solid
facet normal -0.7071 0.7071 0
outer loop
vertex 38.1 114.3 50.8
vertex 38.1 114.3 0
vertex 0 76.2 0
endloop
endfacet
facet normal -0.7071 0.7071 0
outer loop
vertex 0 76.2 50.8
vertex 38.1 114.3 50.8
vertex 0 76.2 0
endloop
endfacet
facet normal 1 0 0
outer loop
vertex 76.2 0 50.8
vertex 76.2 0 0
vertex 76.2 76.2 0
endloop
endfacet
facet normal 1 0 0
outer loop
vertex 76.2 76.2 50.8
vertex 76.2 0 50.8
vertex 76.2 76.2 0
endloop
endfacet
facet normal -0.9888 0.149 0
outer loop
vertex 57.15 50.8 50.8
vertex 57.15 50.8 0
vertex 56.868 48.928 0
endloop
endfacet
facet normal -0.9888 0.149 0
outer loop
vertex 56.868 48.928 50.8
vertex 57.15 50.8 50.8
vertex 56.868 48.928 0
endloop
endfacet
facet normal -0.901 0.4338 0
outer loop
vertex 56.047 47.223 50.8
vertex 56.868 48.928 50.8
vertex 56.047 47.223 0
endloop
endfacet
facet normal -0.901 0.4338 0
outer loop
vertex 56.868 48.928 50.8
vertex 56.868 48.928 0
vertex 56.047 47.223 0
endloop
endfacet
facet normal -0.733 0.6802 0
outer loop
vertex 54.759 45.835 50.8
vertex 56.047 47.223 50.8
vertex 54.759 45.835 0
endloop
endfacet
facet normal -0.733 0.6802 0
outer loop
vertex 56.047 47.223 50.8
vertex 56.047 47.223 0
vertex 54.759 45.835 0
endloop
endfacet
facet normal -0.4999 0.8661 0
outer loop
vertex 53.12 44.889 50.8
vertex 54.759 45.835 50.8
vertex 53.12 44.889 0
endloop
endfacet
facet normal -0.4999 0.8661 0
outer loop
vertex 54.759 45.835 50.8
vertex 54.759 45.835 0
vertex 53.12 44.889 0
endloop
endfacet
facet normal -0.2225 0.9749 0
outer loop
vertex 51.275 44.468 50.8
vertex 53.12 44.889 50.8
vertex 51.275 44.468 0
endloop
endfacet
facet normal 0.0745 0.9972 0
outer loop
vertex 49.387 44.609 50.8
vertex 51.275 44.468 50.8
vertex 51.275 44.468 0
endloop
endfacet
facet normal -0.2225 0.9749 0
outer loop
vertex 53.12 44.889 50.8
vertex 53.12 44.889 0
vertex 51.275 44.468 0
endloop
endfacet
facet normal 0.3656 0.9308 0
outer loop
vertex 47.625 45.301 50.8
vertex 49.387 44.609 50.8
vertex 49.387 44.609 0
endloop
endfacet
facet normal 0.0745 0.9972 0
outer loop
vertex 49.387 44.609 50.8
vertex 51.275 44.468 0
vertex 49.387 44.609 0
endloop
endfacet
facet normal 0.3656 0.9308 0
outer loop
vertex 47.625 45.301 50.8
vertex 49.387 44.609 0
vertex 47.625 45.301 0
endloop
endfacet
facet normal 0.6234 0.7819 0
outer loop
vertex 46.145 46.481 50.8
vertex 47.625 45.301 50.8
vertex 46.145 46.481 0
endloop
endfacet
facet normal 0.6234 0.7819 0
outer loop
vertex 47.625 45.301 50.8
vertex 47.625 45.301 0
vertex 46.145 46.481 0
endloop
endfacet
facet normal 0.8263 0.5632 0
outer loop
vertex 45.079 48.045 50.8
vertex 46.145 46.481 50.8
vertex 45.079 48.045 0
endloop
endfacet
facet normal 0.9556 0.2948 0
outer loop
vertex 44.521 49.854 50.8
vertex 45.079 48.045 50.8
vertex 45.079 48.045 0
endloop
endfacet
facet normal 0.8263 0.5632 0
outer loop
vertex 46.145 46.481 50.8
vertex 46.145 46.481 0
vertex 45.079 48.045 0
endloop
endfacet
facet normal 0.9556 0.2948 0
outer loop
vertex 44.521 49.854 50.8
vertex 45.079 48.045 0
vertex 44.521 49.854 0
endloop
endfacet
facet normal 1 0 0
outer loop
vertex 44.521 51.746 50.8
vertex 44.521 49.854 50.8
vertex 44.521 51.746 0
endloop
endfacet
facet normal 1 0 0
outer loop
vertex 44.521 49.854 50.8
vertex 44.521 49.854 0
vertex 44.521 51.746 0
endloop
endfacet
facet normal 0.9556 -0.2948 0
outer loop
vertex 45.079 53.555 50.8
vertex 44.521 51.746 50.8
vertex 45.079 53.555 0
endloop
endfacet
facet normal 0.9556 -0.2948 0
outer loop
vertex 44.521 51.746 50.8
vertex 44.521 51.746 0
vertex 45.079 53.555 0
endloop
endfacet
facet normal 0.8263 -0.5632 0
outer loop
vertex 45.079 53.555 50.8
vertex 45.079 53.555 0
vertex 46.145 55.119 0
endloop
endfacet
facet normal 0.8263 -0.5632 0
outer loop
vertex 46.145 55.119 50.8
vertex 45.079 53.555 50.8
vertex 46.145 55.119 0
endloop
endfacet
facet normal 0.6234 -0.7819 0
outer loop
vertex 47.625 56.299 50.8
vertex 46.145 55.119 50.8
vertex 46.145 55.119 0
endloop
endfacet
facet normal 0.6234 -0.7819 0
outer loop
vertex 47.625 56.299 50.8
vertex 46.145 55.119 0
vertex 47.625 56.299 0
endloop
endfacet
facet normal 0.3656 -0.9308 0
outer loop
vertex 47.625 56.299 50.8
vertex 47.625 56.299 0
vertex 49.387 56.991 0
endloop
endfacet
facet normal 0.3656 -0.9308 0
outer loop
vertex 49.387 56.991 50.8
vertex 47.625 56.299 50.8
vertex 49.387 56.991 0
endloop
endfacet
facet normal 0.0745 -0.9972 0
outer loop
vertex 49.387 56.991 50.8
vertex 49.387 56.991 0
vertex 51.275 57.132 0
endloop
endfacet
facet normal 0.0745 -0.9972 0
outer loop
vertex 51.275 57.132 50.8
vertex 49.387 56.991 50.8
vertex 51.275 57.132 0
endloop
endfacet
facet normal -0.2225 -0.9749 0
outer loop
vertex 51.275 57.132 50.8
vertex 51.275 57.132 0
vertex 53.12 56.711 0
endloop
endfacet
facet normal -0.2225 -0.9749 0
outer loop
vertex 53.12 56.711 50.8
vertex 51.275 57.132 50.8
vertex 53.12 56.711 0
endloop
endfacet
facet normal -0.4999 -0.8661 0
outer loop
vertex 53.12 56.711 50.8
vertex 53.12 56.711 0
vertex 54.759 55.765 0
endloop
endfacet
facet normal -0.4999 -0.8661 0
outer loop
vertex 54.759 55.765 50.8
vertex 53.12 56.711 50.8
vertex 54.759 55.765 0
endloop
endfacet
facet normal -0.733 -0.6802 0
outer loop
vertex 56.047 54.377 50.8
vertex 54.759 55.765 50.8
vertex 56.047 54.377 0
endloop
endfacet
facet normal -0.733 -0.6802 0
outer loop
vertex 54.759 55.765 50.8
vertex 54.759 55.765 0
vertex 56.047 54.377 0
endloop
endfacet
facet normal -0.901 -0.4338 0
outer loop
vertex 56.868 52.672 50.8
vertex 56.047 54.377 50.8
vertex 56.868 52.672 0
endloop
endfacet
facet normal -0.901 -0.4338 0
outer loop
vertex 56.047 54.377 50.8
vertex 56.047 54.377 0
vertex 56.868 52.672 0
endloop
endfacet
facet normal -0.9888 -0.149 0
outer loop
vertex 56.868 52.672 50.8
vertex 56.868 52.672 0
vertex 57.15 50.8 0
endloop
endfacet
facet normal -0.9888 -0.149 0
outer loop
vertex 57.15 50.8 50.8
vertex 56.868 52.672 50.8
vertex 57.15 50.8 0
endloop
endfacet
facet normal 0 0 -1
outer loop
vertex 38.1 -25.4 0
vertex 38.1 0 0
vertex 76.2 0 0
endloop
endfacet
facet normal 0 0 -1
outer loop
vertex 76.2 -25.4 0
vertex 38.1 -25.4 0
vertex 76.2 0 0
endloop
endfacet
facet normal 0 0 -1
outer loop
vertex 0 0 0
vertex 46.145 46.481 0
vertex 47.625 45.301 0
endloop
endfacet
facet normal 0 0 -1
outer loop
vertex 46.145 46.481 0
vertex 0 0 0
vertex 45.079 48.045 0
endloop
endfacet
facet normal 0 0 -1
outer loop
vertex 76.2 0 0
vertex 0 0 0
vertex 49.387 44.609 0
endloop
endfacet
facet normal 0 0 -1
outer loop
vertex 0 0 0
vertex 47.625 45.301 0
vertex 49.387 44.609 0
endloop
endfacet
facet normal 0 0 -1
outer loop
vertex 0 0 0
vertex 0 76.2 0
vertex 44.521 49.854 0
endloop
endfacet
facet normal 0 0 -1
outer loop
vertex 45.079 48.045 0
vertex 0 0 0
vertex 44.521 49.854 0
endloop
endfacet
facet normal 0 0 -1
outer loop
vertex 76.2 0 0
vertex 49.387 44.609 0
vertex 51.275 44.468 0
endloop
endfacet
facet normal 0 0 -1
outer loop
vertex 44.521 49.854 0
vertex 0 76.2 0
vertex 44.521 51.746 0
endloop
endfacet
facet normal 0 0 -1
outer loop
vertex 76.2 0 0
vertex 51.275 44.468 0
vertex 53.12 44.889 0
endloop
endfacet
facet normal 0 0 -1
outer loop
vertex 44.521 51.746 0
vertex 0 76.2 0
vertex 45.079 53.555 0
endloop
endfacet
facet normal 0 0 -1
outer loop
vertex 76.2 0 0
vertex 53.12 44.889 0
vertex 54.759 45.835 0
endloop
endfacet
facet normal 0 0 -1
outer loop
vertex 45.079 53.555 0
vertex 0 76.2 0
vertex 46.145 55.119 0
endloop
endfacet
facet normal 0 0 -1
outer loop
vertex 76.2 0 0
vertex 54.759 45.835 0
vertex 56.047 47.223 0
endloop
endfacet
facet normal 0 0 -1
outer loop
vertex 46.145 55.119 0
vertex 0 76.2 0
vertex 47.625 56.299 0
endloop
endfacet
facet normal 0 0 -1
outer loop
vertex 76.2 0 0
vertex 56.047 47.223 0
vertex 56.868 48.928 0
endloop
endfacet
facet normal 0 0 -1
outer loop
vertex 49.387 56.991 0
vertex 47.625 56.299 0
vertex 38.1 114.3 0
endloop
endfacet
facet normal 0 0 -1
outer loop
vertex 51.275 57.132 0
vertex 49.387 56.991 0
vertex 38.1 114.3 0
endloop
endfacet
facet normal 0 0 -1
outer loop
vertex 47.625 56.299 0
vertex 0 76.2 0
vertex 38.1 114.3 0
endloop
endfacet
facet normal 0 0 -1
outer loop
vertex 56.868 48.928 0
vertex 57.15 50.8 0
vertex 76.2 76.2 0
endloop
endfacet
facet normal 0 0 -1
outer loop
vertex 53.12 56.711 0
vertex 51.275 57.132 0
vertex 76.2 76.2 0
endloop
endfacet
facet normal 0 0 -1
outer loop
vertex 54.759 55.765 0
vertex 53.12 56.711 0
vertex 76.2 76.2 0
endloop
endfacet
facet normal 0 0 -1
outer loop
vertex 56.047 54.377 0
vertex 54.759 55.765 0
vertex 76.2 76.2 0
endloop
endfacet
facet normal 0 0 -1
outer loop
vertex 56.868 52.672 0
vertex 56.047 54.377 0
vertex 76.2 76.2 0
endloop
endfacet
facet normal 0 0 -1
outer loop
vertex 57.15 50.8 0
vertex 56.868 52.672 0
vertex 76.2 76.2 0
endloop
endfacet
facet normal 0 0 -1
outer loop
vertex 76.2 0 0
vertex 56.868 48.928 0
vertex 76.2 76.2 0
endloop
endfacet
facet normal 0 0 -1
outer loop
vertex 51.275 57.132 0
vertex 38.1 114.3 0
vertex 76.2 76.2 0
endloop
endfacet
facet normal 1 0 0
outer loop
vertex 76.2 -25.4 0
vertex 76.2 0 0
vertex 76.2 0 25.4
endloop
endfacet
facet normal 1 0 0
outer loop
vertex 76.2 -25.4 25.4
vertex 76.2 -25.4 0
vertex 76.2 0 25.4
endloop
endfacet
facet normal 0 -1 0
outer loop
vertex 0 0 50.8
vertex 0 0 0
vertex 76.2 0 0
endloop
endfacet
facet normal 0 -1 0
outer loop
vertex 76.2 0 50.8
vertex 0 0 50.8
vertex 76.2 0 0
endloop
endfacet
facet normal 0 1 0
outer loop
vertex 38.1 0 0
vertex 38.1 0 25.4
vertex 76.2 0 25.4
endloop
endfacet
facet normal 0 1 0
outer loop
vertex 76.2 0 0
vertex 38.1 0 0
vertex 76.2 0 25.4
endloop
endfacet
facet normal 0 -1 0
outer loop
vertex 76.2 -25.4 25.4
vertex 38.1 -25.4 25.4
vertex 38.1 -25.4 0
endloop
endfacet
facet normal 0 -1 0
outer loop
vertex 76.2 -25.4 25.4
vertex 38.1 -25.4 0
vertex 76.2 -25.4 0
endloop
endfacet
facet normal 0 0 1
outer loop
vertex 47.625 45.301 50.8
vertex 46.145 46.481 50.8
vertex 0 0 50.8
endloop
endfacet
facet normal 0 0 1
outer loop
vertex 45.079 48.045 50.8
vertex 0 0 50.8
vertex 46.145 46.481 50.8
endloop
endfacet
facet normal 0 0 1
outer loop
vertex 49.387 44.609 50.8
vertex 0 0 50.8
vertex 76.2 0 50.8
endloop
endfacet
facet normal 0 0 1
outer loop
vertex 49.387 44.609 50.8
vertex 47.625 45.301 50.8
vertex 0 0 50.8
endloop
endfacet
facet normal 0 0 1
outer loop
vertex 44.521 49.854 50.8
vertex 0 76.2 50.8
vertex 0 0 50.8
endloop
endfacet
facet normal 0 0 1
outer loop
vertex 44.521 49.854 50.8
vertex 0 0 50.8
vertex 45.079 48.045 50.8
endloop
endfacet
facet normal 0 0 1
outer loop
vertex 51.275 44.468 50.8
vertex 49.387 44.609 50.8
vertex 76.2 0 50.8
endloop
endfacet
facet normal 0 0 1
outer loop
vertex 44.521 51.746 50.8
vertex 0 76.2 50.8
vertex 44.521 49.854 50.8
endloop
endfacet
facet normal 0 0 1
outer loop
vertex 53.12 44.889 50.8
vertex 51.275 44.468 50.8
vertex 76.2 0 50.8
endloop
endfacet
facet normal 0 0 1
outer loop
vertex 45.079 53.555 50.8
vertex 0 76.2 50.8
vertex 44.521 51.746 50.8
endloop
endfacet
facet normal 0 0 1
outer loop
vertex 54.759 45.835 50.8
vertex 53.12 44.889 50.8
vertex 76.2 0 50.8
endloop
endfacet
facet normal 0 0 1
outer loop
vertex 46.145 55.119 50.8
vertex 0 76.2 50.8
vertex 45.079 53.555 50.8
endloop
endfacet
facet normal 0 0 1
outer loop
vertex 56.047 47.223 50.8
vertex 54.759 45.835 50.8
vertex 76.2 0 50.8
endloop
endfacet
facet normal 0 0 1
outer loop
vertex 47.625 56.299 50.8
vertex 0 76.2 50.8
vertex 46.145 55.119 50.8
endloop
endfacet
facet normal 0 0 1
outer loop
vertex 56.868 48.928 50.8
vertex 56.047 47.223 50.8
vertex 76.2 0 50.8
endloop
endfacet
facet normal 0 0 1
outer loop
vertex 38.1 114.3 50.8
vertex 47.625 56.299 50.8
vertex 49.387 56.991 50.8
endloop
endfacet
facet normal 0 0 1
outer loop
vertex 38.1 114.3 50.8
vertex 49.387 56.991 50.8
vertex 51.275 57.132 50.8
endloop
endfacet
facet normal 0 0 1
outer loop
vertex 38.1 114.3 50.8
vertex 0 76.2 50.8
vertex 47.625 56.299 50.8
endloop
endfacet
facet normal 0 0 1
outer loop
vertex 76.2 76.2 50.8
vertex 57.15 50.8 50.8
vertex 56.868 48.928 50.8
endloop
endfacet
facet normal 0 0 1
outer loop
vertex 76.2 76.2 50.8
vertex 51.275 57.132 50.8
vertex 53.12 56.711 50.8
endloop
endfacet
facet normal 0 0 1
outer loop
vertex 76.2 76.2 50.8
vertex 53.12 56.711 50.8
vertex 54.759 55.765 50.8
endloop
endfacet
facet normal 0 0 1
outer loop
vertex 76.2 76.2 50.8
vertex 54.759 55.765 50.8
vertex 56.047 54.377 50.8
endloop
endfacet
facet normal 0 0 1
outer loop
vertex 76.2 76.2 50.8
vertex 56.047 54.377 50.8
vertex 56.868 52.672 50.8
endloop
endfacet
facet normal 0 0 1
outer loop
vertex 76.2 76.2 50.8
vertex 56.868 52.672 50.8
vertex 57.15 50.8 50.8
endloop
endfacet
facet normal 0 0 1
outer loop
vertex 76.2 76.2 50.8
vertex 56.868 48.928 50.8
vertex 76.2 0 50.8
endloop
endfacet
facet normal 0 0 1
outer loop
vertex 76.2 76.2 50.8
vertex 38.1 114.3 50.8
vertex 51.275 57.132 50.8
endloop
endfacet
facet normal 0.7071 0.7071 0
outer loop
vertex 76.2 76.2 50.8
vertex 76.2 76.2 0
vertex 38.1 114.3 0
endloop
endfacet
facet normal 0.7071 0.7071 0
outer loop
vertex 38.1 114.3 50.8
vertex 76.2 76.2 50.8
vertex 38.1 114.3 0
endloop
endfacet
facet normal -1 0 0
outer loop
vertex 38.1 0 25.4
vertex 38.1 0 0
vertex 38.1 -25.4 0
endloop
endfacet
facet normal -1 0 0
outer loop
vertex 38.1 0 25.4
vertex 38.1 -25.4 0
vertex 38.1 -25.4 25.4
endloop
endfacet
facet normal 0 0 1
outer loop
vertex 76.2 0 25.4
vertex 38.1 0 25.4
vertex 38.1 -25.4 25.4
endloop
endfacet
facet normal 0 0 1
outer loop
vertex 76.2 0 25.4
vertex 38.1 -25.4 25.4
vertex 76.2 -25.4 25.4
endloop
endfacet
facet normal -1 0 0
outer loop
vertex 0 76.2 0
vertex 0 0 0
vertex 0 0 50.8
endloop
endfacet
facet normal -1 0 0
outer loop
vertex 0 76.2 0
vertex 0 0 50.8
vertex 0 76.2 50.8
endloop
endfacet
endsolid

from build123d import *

# Parameters (mm, degrees)
F0_W     = 76.2
F0_H     = 76.2
F1_DEPTH = 50.8
F2_R     = 6.35
F3_DEPTH = 50.8
F4_W     = 38.1
F4_H     = 25.4
F5_DEPTH = 25.4


with BuildPart() as f1:
    # F0 (on Top) → F1 (new body)
    with BuildSketch(Plane.XY):
        with Locations((38.1, 38.1)):
            Rectangle(F0_W, F0_H)
        Polygon((38.1, 114.3), (0, 76.2), (76.2, 76.2), align=None)
    extrude(amount=F1_DEPTH)

    # F2 (on face) → F3 (cut)
    with BuildSketch(Plane(origin=(0, 0, 0), x_dir=(1, 0, 0), z_dir=(0, 0, -1))):
        with Locations((50.8, -50.8)):
            Circle(F2_R)
    extrude(amount=-F3_DEPTH, mode=Mode.SUBTRACT)


with BuildPart() as f5:
    # F4 (on face) → F5 (new body)
    with BuildSketch(Plane.XZ):
        with Locations((57.15, 12.7)):
            Rectangle(F4_W, F4_H)
    extrude(amount=F5_DEPTH)


solid = Compound([f1.part, f5.part])
